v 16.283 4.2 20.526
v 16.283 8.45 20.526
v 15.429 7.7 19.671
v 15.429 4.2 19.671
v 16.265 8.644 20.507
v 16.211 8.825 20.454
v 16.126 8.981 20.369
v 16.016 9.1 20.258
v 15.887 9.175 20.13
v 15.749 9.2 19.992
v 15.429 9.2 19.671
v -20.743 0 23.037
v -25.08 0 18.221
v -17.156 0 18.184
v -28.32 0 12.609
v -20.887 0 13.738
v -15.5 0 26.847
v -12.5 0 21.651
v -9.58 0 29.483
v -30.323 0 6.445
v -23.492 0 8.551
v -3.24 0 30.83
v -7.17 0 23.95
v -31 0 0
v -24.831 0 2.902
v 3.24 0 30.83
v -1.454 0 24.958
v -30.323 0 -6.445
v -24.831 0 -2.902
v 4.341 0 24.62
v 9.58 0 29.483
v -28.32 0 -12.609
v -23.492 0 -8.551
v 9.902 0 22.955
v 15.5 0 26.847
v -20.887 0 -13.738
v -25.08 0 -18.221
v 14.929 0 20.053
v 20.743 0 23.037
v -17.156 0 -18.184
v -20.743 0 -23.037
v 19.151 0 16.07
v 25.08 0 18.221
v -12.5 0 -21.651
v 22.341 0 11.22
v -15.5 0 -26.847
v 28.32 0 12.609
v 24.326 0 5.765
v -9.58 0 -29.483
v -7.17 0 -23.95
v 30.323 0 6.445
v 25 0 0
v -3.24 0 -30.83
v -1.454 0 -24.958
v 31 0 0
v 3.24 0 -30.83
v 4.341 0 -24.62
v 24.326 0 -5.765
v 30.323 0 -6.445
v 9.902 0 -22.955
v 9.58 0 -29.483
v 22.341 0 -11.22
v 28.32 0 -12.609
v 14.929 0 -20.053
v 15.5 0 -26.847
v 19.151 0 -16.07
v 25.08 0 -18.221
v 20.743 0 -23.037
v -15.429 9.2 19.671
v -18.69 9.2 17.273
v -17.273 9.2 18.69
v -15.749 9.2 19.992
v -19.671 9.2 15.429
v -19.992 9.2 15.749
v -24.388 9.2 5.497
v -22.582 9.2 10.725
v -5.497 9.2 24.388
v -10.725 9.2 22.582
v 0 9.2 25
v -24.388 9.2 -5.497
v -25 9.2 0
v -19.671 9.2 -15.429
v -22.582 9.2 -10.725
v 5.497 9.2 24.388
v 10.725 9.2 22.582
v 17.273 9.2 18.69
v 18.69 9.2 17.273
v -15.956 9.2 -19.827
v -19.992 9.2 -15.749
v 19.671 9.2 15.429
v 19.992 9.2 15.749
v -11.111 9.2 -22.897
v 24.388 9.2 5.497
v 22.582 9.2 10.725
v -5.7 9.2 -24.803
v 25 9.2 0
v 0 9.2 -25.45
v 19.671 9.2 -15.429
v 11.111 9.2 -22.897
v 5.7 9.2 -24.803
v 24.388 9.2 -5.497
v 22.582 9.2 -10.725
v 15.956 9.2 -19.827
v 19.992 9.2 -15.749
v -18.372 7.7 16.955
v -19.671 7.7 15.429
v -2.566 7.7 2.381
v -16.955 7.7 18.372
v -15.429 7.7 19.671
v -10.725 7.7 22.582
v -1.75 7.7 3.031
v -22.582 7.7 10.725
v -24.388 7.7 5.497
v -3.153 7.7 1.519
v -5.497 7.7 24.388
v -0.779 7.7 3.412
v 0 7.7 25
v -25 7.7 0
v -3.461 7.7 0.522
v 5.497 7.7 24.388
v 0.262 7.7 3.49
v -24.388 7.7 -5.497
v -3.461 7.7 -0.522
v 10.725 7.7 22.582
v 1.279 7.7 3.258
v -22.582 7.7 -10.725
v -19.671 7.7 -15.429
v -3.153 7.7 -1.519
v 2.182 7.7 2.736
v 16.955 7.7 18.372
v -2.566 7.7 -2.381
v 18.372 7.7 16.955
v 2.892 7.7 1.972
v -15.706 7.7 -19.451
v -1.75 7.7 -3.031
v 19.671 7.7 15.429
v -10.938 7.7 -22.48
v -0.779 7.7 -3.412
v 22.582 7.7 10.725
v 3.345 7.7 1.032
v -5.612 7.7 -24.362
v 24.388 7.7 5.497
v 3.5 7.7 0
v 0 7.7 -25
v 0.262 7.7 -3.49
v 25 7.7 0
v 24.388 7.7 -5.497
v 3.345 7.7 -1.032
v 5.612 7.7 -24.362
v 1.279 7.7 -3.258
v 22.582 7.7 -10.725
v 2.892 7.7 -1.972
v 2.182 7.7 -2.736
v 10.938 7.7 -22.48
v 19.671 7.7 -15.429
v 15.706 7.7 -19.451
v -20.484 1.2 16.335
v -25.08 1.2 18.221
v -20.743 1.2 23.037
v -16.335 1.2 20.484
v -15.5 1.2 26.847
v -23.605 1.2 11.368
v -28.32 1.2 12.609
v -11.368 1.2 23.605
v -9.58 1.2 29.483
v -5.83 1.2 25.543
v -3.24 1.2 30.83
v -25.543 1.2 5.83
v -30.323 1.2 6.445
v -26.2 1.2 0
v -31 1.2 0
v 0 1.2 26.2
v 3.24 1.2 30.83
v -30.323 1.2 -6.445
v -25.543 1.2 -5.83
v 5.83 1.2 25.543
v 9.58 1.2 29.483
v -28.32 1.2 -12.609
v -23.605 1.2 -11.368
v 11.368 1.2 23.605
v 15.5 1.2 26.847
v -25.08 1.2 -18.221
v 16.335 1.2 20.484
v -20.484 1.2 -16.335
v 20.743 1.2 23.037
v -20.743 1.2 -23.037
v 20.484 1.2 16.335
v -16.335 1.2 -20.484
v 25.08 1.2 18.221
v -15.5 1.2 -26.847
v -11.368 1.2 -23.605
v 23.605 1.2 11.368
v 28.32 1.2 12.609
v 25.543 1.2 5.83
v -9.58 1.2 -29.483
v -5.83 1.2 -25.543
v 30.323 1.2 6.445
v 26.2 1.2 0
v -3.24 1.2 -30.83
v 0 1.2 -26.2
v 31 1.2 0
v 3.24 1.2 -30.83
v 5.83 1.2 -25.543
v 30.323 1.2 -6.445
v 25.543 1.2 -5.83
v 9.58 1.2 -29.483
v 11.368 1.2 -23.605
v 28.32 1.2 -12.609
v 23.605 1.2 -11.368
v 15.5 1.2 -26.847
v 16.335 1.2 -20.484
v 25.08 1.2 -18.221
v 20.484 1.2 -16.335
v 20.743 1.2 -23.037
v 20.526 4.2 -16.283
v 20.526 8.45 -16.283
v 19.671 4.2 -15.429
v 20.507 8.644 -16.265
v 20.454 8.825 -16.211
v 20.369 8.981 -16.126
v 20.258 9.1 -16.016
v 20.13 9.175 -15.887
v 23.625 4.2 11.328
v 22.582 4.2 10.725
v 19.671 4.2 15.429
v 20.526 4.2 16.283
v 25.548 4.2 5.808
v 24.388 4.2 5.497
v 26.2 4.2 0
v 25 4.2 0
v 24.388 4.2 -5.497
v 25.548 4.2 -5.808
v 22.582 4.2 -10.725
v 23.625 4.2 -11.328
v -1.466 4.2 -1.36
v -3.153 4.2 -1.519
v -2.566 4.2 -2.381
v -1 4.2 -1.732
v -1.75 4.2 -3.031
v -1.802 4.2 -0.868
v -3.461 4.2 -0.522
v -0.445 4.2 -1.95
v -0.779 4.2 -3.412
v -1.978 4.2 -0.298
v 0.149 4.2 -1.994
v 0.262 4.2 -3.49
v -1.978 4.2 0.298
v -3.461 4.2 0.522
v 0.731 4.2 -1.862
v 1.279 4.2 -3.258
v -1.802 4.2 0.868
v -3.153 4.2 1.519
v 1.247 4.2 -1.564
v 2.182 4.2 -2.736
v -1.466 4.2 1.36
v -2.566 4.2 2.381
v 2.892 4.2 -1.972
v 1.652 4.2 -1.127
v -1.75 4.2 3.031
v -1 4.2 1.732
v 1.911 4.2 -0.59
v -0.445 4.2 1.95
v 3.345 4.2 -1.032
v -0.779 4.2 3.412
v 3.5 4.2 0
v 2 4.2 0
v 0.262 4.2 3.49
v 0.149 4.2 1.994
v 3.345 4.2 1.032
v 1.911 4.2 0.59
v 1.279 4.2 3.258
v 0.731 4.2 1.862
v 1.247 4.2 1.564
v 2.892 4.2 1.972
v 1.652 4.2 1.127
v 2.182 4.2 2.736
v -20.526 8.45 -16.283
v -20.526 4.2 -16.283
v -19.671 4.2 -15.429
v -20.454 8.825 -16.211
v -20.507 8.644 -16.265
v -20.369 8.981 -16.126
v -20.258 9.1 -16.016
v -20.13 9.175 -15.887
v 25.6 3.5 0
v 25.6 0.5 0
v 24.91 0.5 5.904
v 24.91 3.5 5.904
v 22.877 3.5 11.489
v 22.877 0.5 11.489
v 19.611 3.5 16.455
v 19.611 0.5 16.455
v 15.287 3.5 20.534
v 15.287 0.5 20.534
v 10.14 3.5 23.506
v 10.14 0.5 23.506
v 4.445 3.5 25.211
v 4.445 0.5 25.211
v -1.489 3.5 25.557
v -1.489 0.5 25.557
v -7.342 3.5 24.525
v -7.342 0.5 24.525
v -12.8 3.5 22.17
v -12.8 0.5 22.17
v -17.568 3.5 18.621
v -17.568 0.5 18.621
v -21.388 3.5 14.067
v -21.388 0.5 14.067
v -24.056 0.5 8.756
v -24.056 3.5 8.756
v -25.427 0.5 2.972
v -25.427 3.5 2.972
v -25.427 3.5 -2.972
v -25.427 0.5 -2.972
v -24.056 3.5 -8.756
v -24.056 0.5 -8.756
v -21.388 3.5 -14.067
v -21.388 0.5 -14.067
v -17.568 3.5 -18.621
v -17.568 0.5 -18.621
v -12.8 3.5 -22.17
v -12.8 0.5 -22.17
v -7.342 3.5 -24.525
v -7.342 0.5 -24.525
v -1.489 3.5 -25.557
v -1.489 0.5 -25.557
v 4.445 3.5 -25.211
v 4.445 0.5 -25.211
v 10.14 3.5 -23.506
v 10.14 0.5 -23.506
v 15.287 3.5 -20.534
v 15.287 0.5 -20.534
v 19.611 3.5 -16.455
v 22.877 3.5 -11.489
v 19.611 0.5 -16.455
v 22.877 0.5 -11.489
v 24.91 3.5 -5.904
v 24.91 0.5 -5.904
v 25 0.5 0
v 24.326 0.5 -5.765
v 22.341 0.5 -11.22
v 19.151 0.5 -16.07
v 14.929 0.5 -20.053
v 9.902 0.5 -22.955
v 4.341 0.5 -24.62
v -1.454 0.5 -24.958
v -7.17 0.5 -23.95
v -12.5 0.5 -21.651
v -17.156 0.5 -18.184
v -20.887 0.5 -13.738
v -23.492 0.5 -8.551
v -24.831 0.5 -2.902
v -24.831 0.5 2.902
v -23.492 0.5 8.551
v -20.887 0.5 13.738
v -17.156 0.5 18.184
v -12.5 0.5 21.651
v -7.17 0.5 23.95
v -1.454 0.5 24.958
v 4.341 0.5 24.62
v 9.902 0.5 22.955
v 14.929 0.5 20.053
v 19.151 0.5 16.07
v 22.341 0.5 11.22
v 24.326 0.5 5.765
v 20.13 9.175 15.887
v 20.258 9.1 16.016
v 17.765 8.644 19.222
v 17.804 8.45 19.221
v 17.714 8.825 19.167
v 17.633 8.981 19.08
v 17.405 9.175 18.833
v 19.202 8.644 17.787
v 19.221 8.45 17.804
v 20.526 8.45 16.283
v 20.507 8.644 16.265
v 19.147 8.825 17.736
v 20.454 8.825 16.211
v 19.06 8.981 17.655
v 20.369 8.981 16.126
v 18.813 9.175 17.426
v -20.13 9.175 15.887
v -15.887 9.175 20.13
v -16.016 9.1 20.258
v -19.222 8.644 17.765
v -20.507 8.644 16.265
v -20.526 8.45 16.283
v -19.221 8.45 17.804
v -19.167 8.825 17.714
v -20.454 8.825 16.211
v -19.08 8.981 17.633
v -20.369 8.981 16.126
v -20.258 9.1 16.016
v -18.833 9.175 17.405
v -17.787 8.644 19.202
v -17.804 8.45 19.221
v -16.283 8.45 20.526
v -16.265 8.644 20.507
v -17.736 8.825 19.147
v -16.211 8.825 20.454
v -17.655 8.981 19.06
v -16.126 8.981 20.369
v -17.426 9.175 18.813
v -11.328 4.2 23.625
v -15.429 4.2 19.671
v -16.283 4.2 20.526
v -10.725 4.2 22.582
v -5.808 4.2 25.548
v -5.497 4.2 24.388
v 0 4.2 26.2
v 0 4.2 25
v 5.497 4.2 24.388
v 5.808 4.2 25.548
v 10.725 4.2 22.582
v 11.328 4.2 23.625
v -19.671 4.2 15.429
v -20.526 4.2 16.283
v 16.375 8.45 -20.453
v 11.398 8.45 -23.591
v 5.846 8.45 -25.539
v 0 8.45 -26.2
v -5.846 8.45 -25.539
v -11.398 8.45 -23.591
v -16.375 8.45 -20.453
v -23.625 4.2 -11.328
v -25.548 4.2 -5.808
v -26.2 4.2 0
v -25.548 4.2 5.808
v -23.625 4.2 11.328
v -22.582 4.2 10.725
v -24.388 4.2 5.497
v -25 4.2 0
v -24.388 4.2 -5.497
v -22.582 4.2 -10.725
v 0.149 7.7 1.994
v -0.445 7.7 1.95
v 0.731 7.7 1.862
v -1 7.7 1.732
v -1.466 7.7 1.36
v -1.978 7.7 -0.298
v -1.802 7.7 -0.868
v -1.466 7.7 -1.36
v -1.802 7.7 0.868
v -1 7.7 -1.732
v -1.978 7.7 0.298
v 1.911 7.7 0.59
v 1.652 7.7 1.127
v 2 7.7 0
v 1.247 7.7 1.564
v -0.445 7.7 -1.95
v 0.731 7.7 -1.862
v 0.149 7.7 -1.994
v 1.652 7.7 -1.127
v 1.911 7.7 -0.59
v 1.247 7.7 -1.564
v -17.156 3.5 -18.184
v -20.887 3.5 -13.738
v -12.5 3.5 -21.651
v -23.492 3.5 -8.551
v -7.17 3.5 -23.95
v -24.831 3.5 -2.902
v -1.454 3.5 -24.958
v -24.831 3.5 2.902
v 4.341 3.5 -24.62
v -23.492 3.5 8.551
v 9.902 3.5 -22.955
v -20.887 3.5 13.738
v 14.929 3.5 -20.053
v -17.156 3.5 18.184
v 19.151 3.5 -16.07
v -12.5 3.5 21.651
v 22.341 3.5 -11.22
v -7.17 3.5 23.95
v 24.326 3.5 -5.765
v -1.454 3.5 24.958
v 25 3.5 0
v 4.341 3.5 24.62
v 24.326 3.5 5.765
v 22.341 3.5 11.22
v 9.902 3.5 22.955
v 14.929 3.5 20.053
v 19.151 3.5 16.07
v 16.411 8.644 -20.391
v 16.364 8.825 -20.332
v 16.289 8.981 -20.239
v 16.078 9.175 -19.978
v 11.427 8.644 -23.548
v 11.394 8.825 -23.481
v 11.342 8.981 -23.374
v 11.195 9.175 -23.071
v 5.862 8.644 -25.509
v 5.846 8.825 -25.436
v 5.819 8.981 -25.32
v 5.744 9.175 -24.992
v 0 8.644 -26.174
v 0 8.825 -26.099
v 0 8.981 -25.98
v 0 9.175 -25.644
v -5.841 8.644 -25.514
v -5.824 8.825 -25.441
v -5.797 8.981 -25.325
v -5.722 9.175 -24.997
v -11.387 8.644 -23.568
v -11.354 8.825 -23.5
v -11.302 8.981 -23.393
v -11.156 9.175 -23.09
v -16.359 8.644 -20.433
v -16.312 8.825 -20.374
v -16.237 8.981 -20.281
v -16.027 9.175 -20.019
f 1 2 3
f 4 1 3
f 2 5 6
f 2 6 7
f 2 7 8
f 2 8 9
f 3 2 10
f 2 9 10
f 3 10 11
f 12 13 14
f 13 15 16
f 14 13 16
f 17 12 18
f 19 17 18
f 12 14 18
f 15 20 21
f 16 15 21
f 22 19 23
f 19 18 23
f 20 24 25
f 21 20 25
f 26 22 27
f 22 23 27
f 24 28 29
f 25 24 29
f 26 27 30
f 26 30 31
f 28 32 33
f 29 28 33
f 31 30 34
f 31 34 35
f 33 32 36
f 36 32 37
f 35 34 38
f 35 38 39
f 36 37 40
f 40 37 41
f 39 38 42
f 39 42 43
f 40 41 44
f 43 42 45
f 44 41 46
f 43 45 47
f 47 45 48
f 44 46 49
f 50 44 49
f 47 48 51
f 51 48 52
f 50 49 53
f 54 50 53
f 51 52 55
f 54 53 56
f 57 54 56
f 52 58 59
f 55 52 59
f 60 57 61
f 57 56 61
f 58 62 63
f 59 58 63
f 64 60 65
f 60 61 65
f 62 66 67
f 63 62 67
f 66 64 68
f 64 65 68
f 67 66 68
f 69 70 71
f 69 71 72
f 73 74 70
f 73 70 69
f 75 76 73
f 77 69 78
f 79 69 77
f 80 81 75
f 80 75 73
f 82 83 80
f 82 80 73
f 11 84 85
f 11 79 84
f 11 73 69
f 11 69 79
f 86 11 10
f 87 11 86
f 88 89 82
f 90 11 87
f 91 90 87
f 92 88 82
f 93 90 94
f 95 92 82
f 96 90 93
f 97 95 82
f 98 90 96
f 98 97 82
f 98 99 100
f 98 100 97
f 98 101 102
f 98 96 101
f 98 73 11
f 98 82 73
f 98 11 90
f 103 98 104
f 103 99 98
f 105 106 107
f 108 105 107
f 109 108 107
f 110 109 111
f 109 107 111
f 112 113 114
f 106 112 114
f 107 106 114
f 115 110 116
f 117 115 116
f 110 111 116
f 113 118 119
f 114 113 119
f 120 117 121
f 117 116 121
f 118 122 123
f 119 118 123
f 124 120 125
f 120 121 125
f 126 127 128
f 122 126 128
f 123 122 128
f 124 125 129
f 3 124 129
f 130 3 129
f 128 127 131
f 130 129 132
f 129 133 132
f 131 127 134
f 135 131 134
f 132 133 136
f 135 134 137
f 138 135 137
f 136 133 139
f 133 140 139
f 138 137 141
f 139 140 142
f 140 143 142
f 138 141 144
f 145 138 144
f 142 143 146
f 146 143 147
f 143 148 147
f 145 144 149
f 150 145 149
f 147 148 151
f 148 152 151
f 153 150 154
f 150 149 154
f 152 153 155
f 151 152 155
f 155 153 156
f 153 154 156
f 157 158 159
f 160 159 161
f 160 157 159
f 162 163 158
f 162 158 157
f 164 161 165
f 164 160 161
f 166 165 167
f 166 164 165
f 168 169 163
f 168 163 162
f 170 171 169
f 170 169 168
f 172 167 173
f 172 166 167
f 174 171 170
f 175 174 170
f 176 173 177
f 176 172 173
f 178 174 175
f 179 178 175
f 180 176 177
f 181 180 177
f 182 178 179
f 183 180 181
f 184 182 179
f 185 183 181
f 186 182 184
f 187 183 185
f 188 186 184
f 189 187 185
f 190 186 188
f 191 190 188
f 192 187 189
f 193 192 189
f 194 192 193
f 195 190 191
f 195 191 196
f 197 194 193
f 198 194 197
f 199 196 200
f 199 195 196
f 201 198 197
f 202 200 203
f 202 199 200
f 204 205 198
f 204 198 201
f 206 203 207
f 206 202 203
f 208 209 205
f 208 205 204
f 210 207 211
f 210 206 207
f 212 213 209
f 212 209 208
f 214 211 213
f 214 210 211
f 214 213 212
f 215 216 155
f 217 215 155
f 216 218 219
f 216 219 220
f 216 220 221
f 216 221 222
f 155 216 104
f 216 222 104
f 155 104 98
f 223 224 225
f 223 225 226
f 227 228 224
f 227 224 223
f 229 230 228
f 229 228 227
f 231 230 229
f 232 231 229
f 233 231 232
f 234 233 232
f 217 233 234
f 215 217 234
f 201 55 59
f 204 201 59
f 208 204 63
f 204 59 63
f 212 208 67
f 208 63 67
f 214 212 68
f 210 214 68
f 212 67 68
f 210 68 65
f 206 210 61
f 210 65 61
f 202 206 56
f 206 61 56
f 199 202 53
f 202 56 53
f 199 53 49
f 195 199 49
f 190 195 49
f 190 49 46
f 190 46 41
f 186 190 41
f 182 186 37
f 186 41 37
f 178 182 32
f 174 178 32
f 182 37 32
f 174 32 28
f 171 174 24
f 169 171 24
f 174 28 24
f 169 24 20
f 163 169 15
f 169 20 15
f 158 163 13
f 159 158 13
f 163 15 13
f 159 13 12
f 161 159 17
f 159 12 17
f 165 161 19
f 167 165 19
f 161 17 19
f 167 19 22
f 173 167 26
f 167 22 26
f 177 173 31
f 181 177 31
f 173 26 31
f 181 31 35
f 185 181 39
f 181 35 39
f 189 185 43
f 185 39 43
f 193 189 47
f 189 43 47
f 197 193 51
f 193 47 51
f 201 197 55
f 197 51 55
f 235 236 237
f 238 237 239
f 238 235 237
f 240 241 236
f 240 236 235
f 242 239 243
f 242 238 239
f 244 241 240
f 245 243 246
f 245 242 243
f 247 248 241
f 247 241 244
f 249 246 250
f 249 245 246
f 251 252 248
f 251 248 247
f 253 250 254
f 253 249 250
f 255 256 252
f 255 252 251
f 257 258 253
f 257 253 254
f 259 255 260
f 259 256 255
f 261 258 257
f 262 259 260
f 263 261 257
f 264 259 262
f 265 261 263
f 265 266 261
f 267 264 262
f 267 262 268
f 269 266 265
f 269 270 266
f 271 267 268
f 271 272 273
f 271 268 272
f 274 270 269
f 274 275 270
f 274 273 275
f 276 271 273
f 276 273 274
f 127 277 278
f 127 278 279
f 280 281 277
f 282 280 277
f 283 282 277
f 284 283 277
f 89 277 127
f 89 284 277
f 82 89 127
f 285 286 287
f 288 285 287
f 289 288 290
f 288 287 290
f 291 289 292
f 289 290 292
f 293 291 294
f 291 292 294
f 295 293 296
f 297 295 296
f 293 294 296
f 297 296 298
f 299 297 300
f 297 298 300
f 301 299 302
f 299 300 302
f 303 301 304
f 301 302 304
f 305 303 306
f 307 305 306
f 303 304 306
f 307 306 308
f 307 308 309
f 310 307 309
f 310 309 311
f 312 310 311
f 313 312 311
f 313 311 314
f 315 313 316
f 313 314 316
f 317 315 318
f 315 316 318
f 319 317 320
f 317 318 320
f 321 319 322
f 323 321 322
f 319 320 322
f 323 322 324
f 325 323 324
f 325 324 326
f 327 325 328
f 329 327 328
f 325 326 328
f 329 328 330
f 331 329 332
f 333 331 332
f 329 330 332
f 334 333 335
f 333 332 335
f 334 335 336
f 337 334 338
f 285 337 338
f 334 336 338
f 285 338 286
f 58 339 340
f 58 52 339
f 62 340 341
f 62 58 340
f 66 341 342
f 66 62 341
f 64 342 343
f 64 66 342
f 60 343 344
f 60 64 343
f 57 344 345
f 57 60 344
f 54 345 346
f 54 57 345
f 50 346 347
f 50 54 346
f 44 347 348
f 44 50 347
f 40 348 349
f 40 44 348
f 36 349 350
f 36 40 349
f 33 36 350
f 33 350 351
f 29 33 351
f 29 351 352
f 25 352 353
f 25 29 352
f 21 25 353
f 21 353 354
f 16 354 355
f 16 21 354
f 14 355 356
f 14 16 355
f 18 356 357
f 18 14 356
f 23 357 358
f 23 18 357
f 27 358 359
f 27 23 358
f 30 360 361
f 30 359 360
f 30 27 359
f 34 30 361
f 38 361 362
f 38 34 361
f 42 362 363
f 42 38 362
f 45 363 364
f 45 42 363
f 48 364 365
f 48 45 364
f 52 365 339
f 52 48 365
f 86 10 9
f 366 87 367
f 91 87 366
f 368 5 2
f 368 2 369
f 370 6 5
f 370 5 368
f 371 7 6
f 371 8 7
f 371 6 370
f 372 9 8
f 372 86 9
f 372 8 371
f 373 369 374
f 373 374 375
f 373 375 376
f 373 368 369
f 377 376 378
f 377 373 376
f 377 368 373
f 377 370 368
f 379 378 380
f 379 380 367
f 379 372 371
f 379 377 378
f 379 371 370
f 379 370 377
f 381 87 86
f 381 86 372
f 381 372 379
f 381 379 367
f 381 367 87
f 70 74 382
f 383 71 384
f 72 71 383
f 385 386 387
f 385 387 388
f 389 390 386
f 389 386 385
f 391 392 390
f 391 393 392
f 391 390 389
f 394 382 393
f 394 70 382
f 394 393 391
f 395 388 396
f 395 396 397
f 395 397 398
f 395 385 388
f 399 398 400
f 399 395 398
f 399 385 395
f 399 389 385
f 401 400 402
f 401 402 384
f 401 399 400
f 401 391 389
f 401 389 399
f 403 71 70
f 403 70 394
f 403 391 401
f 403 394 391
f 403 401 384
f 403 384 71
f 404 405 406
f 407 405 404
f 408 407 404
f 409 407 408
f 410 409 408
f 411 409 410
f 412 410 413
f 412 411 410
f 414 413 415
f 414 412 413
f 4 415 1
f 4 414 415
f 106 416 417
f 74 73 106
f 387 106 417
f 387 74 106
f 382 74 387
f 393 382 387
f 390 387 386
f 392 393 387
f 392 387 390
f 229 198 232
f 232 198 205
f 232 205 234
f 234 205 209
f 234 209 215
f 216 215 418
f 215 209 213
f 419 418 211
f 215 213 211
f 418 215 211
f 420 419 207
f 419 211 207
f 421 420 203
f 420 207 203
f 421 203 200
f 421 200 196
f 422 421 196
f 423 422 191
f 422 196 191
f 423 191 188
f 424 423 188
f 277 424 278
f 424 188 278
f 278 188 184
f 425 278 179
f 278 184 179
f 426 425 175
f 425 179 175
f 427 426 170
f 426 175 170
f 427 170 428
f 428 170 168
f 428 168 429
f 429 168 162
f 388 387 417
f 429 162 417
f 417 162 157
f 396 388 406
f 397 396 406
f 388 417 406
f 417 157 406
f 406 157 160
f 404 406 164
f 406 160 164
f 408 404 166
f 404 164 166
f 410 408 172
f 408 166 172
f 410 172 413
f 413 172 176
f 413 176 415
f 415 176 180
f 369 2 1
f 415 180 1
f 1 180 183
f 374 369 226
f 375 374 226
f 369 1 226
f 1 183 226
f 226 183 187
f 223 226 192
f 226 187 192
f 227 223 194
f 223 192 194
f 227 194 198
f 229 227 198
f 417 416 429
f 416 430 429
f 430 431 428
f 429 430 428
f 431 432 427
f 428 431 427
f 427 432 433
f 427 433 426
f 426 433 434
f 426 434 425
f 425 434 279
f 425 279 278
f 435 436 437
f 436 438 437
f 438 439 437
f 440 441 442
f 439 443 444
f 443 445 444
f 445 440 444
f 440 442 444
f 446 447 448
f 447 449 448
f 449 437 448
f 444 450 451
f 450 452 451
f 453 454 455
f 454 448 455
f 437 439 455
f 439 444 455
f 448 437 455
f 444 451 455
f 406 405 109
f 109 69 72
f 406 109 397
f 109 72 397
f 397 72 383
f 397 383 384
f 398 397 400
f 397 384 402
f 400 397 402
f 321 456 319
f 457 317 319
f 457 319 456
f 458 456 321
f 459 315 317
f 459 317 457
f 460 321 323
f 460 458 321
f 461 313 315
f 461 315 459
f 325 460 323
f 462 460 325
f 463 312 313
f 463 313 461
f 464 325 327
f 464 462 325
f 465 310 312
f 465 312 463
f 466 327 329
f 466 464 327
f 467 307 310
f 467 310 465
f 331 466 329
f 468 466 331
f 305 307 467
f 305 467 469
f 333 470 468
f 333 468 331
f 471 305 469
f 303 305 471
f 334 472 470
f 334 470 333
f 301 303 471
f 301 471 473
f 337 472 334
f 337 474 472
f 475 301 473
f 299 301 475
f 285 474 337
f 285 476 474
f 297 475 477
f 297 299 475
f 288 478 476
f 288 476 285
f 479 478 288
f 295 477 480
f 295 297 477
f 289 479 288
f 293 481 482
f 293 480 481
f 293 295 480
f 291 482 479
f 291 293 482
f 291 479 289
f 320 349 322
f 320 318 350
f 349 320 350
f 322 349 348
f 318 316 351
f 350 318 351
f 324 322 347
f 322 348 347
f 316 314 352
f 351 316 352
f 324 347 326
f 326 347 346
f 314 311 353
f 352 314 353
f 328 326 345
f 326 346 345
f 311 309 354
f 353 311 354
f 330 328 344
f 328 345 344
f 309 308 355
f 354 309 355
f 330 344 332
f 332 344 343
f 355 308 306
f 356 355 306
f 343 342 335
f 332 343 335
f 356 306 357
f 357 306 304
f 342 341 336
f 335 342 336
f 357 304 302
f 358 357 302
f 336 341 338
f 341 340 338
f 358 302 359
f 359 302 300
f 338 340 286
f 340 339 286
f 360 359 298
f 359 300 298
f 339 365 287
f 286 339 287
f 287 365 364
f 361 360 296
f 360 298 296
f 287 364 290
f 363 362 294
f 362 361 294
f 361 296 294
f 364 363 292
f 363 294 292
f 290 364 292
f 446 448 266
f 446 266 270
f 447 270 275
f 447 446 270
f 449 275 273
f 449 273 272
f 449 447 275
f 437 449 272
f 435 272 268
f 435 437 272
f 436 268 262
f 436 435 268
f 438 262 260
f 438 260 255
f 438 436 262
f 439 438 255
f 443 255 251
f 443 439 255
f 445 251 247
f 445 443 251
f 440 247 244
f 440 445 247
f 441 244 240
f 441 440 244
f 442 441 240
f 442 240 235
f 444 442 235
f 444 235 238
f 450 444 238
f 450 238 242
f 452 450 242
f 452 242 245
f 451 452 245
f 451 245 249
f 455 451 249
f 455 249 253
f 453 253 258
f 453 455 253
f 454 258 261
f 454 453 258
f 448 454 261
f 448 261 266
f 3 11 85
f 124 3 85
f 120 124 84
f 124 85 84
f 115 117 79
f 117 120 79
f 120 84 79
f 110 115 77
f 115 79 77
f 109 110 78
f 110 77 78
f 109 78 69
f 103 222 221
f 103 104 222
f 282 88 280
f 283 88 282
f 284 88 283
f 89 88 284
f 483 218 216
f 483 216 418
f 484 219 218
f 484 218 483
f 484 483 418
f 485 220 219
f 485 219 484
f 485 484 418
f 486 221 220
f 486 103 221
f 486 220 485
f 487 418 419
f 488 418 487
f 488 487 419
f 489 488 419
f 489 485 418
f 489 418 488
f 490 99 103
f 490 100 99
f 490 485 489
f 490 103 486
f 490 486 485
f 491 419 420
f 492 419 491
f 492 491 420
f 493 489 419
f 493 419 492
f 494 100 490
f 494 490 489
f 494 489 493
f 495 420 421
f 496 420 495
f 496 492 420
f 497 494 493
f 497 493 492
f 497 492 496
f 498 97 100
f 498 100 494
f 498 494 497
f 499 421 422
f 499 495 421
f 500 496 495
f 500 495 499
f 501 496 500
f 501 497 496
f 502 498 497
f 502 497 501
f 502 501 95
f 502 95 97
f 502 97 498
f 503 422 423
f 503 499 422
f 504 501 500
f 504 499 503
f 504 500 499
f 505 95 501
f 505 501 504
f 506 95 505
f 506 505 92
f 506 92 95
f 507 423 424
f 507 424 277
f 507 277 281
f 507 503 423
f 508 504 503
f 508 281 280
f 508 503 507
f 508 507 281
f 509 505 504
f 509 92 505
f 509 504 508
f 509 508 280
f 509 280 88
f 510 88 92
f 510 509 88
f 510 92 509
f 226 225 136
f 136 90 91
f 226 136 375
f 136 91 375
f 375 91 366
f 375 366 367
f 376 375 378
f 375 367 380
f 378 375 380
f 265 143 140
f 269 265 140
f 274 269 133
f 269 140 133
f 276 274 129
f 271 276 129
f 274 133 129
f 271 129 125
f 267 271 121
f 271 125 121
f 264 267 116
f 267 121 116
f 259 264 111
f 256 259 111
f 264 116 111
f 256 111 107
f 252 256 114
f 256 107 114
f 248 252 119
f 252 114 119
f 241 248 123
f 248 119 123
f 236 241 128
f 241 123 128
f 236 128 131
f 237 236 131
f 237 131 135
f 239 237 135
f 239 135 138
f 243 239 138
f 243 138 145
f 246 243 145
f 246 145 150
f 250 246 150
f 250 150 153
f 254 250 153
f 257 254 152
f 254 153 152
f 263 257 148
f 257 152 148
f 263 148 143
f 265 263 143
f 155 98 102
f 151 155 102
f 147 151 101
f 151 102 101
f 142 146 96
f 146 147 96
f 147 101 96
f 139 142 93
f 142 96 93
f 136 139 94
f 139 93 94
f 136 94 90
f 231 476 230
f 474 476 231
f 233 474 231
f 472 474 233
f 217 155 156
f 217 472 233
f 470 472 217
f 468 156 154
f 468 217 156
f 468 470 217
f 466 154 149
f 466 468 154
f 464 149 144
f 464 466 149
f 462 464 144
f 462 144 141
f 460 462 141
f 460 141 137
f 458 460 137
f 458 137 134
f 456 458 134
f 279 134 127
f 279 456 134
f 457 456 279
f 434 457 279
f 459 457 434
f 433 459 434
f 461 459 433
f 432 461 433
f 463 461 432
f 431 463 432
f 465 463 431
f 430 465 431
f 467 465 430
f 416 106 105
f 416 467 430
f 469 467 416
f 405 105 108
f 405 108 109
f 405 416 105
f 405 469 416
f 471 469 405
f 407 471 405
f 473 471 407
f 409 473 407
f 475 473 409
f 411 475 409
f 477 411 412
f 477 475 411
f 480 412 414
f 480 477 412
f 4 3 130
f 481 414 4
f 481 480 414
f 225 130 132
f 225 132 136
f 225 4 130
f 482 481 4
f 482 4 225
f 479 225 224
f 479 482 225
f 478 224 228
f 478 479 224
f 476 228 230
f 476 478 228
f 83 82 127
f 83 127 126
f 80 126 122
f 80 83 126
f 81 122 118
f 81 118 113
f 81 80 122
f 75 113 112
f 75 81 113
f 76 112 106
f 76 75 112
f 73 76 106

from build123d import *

# Parameters (mm, degrees)
SKETCH1_R           = 31
SKETCH1_R_2         = 25
BOSS_EXTRUDE1_DEPTH = 1.2
SKETCH2_R           = 26.2
SKETCH2_R_2         = 25
BOSS_EXTRUDE2_DEPTH = 6.5
SKETCH3_R           = 26.2
BOSS_EXTRUDE3_DEPTH = 1.5
CUT_EXTRUDE2_DEPTH  = 5
CUT_EXTRUDE3_START  = -0.5
SKETCH7_R           = 25.6
SKETCH7_R_2         = 25
CUT_EXTRUDE3_DEPTH  = 3
FILLET1_R           = 0.75
SKETCH8_R           = 3.5
SKETCH8_R_2         = 2
BOSS_EXTRUDE4_DEPTH = 3.5


with BuildPart() as part:
    # Sketch1 → Boss-Extrude1 (new body)
    with BuildSketch(Plane(origin=(0, 0, 0), x_dir=(1, 0, 0), z_dir=(0, 1, 0))):
        Circle(SKETCH1_R)
        Circle(SKETCH1_R_2, mode=Mode.SUBTRACT)
    extrude(amount=BOSS_EXTRUDE1_DEPTH)

    # Sketch2 → Boss-Extrude2 (add)
    with BuildSketch(Plane(origin=(0, 1.2, 0), x_dir=(1, 0, 0), z_dir=(0, 1, 0))):
        Circle(SKETCH2_R)
        Circle(SKETCH2_R_2, mode=Mode.SUBTRACT)
    extrude(amount=BOSS_EXTRUDE2_DEPTH)

    # Sketch3 → Boss-Extrude3 (add)
    with BuildSketch(Plane(origin=(0, 7.7, 0), x_dir=(1, 0, 0), z_dir=(0, 1, 0))):
        Circle(SKETCH3_R)
    extrude(amount=BOSS_EXTRUDE3_DEPTH)

    # Sketch5 → Cut-Extrude2 (cut)
    with BuildSketch(Plane(origin=(0, 9.2, 0), x_dir=(1, 0, 0), z_dir=(0, 1, 0))):
        with BuildLine():
            Line((20.525667656, 16.283026969), (19.671249118, 15.428608431))
            ThreePointArc((19.671249118, 15.428608431), (25, 0), (19.671249118, -15.428608431))
            Line((19.671249118, -15.428608431), (20.525667656, -16.283026969))
            ThreePointArc((20.525667656, -16.283026969), (26.2, 0), (20.525667656, 16.283026969))
        make_face()
        with BuildLine():
            Line((16.283026969, -20.525667656), (15.428608431, -19.671249118))
            ThreePointArc((15.428608431, -19.671249118), (0, -25), (-15.428608431, -19.671249118))
            Line((-15.428608431, -19.671249118), (-16.283026969, -20.525667656))
            ThreePointArc((-16.283026969, -20.525667656), (0, -26.2), (16.283026969, -20.525667656))
        make_face()
        with BuildLine():
            Line((-19.671249118, -15.428608431), (-20.525667656, -16.283026969))
            ThreePointArc((-20.525667656, -16.283026969), (-26.2, 0), (-20.525667656, 16.283026969))
            Line((-20.525667656, 16.283026969), (-19.671249118, 15.428608431))
            ThreePointArc((-19.671249118, 15.428608431), (-25, 0), (-19.671249118, -15.428608431))
        make_face()
    extrude(amount=-CUT_EXTRUDE2_DEPTH, mode=Mode.SUBTRACT)

    # Sketch7 → Cut-Extrude3 (cut)
    with BuildSketch(Plane.XZ.offset(CUT_EXTRUDE3_START)):
        Circle(SKETCH7_R)
        Circle(SKETCH7_R_2, mode=Mode.SUBTRACT)
    extrude(amount=-CUT_EXTRUDE3_DEPTH, mode=Mode.SUBTRACT)

    # Fillet1
    fillet1_edges = [part.edges().sort_by_distance(p)[0] for p in [
        (18.526197667, 9.2, 18.526197667),
        (0, 9.2, -26.2),
        (-18.526197667, 9.2, 18.526197667),
    ]]
    fillet(fillet1_edges, radius=FILLET1_R)

    # Sketch8 → Boss-Extrude4 (add)
    with BuildSketch(Plane.XZ.offset(-7.7)):
        Circle(SKETCH8_R)
        Circle(SKETCH8_R_2, mode=Mode.SUBTRACT)
    extrude(amount=BOSS_EXTRUDE4_DEPTH)


solid = part.part
